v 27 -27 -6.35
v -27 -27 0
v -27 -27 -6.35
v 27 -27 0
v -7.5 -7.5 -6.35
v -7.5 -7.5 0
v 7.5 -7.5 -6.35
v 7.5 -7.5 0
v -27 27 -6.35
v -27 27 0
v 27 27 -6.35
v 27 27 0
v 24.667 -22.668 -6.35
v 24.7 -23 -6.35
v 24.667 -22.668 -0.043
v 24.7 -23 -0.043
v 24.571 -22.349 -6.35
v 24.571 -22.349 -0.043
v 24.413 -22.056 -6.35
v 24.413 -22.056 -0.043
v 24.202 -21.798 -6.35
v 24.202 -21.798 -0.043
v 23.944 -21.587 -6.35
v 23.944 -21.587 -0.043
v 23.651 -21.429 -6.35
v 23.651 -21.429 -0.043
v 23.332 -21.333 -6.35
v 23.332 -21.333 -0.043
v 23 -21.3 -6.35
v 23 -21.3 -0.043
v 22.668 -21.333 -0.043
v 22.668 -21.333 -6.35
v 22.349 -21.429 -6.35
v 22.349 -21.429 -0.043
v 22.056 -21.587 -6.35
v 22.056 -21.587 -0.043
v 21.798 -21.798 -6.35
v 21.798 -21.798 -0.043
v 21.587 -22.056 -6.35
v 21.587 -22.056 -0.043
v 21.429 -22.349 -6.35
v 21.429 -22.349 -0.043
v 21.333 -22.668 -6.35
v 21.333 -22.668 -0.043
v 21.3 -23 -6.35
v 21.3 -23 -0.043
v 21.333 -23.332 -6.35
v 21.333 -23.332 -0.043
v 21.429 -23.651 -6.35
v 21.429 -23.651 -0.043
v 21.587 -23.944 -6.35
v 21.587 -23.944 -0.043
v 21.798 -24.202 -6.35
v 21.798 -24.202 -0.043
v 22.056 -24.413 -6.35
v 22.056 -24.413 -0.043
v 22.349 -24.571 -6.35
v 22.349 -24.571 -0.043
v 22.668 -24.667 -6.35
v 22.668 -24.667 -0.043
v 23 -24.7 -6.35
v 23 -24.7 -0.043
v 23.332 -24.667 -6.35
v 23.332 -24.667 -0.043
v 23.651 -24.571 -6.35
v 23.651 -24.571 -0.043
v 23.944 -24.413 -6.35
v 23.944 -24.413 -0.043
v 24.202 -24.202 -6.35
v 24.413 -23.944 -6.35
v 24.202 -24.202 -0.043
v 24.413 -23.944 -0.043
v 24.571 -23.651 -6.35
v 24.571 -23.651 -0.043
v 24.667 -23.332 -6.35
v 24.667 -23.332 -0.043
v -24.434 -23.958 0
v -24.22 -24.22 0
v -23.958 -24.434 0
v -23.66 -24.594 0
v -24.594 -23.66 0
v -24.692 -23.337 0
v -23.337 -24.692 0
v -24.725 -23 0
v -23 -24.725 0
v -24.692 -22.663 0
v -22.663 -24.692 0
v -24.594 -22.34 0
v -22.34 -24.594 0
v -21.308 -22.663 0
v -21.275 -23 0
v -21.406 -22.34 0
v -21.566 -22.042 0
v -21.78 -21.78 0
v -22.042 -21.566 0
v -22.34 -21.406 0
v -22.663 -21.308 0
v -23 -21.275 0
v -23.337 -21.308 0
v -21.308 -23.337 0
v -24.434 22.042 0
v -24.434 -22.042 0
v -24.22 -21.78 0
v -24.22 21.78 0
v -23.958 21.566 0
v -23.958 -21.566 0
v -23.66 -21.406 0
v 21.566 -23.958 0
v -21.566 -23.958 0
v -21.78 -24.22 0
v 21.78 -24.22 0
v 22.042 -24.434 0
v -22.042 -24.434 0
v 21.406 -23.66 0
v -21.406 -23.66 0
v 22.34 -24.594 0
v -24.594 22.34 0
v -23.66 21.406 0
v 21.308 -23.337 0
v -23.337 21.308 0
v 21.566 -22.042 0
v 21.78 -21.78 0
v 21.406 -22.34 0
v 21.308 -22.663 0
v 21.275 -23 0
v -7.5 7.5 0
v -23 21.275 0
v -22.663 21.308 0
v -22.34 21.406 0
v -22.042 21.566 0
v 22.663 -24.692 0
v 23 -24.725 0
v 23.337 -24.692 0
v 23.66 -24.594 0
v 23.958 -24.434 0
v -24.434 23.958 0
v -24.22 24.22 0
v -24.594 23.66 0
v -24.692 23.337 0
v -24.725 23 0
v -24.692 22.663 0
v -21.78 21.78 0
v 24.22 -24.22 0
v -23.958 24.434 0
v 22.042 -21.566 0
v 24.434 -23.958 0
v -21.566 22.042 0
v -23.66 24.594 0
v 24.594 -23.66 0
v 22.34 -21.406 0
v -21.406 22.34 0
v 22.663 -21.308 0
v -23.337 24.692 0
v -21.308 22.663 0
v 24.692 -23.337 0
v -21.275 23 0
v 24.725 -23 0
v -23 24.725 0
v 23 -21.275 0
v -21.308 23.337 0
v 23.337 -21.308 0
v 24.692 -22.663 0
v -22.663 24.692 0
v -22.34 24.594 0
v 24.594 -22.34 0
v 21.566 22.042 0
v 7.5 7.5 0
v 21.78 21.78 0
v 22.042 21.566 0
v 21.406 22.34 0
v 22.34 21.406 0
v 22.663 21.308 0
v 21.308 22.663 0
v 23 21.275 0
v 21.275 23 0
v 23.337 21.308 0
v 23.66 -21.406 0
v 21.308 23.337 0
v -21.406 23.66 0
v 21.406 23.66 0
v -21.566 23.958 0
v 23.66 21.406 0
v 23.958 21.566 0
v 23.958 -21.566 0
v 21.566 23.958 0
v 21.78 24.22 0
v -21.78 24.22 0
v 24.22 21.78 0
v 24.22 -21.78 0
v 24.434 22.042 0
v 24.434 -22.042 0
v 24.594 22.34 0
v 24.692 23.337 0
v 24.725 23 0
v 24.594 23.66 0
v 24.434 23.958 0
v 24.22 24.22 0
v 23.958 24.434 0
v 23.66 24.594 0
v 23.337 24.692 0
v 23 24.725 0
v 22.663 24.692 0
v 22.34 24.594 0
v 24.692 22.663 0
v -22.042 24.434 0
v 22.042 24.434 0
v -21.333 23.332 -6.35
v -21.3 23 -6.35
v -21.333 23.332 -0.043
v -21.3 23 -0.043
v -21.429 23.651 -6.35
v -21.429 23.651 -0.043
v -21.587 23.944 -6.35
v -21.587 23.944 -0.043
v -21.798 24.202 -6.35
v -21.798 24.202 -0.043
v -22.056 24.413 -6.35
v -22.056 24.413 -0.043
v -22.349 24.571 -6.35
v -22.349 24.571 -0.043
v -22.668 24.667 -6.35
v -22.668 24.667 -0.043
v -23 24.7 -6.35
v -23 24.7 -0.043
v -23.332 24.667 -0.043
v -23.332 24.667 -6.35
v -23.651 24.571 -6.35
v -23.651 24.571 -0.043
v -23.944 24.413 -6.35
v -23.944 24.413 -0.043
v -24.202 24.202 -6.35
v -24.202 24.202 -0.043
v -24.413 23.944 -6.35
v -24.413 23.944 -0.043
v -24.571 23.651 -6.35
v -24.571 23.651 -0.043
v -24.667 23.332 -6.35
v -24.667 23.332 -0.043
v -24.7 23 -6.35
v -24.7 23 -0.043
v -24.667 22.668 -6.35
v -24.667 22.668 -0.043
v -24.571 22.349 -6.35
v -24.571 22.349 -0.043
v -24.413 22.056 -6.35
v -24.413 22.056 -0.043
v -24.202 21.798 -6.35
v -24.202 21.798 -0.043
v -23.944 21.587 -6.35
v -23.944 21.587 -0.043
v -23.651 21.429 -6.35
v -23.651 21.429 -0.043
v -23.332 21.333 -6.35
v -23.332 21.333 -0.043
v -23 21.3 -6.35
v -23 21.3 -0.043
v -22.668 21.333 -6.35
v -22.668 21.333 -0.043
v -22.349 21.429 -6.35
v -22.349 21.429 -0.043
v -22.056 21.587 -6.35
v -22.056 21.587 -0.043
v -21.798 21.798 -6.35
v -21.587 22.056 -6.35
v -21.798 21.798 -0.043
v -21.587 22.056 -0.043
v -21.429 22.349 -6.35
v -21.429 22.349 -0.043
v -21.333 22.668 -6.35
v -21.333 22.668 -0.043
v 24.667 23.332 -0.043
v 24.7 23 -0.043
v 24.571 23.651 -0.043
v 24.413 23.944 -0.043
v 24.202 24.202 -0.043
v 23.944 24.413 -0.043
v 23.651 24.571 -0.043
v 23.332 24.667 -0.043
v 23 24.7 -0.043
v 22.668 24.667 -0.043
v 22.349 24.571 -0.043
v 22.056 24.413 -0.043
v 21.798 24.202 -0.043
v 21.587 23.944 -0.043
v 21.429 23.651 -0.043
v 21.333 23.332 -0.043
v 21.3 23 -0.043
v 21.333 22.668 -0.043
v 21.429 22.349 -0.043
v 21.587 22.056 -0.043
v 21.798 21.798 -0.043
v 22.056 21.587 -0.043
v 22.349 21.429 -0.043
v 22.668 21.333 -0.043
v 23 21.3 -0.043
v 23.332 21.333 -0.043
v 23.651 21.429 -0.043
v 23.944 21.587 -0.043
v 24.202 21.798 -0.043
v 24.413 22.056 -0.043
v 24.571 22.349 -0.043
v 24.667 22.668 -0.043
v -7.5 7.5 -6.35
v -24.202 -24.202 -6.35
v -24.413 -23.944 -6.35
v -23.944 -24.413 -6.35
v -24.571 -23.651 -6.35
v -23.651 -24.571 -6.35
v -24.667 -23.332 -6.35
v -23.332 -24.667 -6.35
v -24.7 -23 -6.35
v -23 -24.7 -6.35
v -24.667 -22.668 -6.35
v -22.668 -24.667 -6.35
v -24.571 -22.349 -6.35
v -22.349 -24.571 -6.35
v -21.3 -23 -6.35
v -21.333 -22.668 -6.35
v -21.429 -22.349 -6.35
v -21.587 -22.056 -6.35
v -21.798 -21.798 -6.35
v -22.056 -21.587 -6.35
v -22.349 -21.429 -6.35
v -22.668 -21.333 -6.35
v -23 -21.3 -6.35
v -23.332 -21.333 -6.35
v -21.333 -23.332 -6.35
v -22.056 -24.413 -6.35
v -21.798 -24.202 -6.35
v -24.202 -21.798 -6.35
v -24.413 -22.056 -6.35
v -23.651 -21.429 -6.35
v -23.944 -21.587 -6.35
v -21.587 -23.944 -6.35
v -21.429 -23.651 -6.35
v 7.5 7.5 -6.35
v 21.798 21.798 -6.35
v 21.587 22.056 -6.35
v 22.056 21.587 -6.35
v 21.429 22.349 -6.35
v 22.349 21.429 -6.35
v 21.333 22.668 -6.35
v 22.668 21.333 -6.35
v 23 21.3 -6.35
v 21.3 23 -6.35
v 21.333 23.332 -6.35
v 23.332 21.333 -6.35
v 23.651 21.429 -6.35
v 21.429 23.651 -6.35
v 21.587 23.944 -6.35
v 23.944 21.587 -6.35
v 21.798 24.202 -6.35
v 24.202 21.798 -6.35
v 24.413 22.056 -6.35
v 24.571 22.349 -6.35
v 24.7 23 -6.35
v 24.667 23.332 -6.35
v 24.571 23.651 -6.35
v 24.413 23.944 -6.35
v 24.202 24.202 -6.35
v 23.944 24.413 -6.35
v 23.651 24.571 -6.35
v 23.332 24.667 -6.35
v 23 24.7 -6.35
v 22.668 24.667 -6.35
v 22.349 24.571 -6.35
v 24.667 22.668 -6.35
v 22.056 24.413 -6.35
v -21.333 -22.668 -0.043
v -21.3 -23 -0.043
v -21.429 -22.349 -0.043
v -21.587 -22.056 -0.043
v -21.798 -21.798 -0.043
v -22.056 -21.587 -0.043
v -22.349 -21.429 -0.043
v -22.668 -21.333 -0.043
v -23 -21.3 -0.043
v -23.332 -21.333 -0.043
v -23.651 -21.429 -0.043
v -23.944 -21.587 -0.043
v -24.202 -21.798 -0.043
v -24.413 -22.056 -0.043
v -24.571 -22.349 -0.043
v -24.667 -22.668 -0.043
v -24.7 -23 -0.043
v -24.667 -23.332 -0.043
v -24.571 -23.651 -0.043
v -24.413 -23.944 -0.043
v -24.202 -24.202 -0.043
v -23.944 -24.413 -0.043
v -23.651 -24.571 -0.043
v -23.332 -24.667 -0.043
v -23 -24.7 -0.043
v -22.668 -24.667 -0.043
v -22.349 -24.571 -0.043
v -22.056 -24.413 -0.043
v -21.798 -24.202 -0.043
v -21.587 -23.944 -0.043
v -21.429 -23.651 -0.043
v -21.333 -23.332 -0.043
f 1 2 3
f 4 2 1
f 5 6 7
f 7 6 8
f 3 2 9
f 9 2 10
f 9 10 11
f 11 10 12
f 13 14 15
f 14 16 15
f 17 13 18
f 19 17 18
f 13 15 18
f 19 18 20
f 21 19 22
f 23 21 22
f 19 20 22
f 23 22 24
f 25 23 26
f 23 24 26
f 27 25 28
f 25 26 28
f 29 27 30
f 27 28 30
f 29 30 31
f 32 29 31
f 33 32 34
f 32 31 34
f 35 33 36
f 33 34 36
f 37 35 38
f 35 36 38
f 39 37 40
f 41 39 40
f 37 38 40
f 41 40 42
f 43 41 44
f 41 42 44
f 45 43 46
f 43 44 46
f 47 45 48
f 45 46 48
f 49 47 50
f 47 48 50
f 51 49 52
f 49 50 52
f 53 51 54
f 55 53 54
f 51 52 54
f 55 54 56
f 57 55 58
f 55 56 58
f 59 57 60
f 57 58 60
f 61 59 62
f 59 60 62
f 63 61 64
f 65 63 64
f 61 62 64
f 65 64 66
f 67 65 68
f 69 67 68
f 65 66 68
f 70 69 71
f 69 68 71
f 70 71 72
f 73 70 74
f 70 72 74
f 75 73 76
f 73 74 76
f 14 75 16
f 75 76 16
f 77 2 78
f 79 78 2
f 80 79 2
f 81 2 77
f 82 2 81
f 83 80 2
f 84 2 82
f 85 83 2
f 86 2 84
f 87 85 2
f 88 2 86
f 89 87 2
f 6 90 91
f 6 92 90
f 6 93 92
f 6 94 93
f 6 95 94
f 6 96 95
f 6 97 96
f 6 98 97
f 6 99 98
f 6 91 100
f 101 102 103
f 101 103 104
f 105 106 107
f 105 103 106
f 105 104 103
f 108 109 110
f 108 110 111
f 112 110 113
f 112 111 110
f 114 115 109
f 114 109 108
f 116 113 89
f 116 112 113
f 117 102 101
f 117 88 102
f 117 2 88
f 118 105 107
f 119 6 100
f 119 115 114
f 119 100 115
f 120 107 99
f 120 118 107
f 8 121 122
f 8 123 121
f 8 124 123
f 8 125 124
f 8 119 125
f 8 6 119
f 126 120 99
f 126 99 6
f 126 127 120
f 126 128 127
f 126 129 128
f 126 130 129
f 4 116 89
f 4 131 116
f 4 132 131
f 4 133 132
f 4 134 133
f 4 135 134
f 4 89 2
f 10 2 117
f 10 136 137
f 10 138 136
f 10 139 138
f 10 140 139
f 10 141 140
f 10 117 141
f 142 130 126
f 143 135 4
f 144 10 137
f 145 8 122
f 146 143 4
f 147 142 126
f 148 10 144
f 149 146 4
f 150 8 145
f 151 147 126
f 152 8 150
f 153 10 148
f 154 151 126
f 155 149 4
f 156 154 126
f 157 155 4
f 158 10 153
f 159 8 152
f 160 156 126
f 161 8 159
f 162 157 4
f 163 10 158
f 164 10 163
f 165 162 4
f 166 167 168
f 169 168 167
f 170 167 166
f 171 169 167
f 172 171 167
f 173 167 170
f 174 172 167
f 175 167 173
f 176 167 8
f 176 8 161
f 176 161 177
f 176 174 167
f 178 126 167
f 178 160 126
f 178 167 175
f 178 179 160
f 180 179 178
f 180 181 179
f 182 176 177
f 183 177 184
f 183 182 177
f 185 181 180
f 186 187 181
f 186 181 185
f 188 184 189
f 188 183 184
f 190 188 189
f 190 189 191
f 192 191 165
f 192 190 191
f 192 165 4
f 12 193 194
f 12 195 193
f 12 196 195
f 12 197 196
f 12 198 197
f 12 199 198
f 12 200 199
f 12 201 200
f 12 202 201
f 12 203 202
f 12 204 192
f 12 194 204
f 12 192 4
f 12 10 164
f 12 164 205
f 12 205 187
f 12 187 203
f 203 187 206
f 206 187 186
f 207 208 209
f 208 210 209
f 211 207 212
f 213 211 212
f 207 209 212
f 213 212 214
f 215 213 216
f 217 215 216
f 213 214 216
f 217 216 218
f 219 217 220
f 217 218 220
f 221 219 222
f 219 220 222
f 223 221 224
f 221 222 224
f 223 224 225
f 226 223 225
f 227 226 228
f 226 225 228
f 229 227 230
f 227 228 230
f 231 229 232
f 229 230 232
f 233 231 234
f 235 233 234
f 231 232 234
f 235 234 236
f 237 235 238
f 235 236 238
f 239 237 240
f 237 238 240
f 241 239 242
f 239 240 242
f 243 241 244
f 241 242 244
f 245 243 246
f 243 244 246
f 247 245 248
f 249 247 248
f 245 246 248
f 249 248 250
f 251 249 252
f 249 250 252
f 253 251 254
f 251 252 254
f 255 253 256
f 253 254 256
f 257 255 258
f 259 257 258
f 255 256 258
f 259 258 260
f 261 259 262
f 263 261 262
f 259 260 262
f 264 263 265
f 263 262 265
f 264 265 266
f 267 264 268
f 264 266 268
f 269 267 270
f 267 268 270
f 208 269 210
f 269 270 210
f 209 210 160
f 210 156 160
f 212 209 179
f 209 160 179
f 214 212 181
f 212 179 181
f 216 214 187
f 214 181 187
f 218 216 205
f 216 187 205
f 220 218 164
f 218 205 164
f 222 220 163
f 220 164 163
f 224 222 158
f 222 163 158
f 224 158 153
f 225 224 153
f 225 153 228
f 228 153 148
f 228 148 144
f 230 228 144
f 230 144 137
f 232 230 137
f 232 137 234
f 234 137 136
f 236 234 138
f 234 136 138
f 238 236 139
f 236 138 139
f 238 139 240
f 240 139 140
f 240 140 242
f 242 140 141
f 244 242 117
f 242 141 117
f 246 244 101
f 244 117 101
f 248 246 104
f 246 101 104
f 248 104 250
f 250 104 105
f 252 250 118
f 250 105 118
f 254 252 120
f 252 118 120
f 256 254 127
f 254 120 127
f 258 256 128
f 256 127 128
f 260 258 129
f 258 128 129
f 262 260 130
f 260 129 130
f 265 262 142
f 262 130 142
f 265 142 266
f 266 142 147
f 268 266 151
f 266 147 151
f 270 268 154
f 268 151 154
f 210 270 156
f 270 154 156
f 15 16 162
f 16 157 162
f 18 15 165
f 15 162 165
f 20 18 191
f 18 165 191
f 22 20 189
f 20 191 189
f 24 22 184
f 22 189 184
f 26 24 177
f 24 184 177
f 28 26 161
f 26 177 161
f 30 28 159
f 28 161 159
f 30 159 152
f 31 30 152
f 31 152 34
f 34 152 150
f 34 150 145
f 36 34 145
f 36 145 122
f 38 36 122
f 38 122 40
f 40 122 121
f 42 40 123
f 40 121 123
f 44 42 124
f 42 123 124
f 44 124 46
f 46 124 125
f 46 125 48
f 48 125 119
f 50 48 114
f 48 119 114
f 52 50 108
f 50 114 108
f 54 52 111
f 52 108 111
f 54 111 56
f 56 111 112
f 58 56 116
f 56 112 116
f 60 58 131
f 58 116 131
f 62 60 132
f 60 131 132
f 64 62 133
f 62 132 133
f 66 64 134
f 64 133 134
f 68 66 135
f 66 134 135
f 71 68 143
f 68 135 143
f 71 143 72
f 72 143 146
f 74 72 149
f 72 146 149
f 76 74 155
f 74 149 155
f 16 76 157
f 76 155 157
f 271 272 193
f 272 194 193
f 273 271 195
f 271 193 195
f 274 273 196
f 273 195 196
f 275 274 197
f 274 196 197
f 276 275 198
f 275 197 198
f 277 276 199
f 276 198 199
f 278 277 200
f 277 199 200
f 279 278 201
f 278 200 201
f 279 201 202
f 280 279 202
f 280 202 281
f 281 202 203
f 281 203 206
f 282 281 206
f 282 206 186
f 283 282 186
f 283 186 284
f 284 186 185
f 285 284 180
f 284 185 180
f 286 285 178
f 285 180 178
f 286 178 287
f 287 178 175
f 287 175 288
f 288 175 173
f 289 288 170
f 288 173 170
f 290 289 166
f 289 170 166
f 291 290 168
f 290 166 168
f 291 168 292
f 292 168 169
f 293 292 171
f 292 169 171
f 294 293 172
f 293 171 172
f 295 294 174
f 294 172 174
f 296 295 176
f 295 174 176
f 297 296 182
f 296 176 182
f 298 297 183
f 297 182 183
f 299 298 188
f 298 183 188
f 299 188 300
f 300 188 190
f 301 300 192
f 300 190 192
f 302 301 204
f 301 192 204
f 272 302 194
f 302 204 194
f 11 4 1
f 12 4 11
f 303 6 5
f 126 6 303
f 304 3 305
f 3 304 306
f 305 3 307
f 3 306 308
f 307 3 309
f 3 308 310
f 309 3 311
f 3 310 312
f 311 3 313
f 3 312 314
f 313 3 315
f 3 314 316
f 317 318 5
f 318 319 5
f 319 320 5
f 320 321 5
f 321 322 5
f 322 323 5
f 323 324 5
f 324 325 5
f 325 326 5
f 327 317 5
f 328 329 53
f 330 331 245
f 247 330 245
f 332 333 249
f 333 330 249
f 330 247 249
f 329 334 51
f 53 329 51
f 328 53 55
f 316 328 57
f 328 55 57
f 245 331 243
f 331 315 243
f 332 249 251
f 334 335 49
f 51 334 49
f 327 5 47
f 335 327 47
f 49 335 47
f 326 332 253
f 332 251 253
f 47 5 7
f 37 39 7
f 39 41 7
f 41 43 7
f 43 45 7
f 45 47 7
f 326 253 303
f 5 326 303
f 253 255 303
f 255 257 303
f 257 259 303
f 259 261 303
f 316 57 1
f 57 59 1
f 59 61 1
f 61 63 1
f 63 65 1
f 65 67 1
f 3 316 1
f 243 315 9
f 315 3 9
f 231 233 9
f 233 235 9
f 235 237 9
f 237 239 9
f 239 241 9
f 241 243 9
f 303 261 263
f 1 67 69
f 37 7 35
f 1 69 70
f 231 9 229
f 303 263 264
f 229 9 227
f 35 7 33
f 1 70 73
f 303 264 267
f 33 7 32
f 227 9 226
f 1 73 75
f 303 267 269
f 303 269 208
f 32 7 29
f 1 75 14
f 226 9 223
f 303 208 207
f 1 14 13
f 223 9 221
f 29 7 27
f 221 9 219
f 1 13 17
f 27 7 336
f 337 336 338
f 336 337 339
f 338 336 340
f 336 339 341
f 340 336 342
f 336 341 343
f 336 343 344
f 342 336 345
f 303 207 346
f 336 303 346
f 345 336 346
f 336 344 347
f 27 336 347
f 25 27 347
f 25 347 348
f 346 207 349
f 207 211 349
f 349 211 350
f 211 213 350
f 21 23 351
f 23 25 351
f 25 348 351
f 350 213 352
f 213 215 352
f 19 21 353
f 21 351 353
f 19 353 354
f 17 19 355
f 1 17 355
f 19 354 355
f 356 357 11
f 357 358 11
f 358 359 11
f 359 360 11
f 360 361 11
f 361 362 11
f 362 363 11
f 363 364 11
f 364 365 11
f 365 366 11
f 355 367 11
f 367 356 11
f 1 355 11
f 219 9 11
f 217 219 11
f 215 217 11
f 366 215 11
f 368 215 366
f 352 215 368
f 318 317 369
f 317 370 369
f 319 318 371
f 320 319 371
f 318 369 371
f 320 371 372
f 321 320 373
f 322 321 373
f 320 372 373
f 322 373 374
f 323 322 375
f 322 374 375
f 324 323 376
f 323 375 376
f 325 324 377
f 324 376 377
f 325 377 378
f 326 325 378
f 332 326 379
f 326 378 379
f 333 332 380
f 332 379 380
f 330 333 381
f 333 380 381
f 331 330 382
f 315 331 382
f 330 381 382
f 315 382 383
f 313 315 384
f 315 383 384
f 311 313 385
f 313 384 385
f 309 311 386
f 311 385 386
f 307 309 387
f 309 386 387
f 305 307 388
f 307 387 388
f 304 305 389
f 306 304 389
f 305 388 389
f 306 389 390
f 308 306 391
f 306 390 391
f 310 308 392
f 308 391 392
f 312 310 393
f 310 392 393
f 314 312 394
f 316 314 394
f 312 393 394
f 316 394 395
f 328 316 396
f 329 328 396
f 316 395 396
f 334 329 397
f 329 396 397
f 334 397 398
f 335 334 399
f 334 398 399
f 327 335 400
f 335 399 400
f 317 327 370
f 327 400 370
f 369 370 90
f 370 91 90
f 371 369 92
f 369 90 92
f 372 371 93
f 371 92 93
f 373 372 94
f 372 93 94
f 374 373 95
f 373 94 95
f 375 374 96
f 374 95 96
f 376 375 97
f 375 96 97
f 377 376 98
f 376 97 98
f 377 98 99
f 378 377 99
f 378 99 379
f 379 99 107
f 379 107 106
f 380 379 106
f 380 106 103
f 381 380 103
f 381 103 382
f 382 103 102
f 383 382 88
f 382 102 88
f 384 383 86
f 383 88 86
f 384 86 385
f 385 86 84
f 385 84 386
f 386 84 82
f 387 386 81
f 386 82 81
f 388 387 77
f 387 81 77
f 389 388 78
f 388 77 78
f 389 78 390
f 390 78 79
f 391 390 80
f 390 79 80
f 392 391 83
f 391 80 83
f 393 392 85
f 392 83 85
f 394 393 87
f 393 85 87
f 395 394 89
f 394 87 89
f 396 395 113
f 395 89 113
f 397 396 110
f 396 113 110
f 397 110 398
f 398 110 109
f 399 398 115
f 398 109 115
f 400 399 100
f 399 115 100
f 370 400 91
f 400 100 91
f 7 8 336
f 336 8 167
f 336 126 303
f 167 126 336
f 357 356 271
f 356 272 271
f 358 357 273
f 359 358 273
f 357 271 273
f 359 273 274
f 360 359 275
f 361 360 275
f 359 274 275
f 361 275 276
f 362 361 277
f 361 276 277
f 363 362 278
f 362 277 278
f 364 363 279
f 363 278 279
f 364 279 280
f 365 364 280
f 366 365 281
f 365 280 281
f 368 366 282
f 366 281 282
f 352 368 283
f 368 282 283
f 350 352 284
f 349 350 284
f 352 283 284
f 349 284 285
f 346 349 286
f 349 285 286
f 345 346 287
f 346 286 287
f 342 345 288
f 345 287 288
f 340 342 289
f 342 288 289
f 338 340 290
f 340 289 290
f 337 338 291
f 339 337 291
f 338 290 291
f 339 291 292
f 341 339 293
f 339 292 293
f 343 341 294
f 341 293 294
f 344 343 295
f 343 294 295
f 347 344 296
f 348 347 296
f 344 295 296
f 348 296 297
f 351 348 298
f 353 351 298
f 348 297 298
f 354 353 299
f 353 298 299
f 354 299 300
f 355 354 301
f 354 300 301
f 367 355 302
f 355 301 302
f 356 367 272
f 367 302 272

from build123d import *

# Parameters (mm, degrees)
SKETCH1_W           = 54
SKETCH1_H           = 54
BOSS_EXTRUDE1_DEPTH = 6.35
SKETCH6_W           = 15
SKETCH6_H           = 15
CUT_EXTRUDE1_DEPTH  = 10


# Read off the part's stored shape, not the designer's step: M3 Clearance Hole1
with BuildPart() as part:
    # Sketch1 → Boss-Extrude1 (new body)
    with BuildSketch(Plane.XY):
        Rectangle(SKETCH1_W, SKETCH1_H)
    extrude(amount=-BOSS_EXTRUDE1_DEPTH)

    # M3 Clearance Hole1 outline → M3 Clearance Hole1 (revolve, cut)
    with BuildSketch(Plane(origin=(23, -23, 0), x_dir=(1, 0, 0), z_dir=(0, -1, 0))):
        Polygon((0, -6.35), (1.7, -6.35), (1.7, -0.04330127), (1.725, 0), (0, 0), align=None)
    revolve(axis=Axis((23, -23, 0), (0, 0, 1)), mode=Mode.SUBTRACT)

    # M3 Clearance Hole1 2 outline → M3 Clearance Hole1 2 (revolve, cut)
    with BuildSketch(Plane(origin=(-23, 23, 0), x_dir=(1, 0, 0), z_dir=(0, -1, 0))):
        Polygon((0, -6.35), (1.7, -6.35), (1.7, -0.04330127), (1.725, 0), (0, 0), align=None)
    revolve(axis=Axis((-23, 23, 0), (0, 0, 1)), mode=Mode.SUBTRACT)

    # M3 Clearance Hole1 3 outline → M3 Clearance Hole1 3 (revolve, cut)
    with BuildSketch(Plane(origin=(-23, -23, 0), x_dir=(1, 0, 0), z_dir=(0, -1, 0))):
        Polygon((0, -6.35), (1.7, -6.35), (1.7, -0.04330127), (1.725, 0), (0, 0), align=None)
    revolve(axis=Axis((-23, -23, 0), (0, 0, 1)), mode=Mode.SUBTRACT)

    # M3 Clearance Hole1 4 outline → M3 Clearance Hole1 4 (revolve, cut)
    with BuildSketch(Plane(origin=(23, 23, 0), x_dir=(1, 0, 0), z_dir=(0, -1, 0))):
        Polygon((0, -6.35), (1.7, -6.35), (1.7, -0.04330127), (1.725, 0), (0, 0), align=None)
    revolve(axis=Axis((23, 23, 0), (0, 0, 1)), mode=Mode.SUBTRACT)

    # Sketch6 → Cut-Extrude1 (cut)
    with BuildSketch(Plane.XY):
        Rectangle(SKETCH6_W, SKETCH6_H)
    extrude(amount=-CUT_EXTRUDE1_DEPTH, mode=Mode.SUBTRACT)


solid = part.part
